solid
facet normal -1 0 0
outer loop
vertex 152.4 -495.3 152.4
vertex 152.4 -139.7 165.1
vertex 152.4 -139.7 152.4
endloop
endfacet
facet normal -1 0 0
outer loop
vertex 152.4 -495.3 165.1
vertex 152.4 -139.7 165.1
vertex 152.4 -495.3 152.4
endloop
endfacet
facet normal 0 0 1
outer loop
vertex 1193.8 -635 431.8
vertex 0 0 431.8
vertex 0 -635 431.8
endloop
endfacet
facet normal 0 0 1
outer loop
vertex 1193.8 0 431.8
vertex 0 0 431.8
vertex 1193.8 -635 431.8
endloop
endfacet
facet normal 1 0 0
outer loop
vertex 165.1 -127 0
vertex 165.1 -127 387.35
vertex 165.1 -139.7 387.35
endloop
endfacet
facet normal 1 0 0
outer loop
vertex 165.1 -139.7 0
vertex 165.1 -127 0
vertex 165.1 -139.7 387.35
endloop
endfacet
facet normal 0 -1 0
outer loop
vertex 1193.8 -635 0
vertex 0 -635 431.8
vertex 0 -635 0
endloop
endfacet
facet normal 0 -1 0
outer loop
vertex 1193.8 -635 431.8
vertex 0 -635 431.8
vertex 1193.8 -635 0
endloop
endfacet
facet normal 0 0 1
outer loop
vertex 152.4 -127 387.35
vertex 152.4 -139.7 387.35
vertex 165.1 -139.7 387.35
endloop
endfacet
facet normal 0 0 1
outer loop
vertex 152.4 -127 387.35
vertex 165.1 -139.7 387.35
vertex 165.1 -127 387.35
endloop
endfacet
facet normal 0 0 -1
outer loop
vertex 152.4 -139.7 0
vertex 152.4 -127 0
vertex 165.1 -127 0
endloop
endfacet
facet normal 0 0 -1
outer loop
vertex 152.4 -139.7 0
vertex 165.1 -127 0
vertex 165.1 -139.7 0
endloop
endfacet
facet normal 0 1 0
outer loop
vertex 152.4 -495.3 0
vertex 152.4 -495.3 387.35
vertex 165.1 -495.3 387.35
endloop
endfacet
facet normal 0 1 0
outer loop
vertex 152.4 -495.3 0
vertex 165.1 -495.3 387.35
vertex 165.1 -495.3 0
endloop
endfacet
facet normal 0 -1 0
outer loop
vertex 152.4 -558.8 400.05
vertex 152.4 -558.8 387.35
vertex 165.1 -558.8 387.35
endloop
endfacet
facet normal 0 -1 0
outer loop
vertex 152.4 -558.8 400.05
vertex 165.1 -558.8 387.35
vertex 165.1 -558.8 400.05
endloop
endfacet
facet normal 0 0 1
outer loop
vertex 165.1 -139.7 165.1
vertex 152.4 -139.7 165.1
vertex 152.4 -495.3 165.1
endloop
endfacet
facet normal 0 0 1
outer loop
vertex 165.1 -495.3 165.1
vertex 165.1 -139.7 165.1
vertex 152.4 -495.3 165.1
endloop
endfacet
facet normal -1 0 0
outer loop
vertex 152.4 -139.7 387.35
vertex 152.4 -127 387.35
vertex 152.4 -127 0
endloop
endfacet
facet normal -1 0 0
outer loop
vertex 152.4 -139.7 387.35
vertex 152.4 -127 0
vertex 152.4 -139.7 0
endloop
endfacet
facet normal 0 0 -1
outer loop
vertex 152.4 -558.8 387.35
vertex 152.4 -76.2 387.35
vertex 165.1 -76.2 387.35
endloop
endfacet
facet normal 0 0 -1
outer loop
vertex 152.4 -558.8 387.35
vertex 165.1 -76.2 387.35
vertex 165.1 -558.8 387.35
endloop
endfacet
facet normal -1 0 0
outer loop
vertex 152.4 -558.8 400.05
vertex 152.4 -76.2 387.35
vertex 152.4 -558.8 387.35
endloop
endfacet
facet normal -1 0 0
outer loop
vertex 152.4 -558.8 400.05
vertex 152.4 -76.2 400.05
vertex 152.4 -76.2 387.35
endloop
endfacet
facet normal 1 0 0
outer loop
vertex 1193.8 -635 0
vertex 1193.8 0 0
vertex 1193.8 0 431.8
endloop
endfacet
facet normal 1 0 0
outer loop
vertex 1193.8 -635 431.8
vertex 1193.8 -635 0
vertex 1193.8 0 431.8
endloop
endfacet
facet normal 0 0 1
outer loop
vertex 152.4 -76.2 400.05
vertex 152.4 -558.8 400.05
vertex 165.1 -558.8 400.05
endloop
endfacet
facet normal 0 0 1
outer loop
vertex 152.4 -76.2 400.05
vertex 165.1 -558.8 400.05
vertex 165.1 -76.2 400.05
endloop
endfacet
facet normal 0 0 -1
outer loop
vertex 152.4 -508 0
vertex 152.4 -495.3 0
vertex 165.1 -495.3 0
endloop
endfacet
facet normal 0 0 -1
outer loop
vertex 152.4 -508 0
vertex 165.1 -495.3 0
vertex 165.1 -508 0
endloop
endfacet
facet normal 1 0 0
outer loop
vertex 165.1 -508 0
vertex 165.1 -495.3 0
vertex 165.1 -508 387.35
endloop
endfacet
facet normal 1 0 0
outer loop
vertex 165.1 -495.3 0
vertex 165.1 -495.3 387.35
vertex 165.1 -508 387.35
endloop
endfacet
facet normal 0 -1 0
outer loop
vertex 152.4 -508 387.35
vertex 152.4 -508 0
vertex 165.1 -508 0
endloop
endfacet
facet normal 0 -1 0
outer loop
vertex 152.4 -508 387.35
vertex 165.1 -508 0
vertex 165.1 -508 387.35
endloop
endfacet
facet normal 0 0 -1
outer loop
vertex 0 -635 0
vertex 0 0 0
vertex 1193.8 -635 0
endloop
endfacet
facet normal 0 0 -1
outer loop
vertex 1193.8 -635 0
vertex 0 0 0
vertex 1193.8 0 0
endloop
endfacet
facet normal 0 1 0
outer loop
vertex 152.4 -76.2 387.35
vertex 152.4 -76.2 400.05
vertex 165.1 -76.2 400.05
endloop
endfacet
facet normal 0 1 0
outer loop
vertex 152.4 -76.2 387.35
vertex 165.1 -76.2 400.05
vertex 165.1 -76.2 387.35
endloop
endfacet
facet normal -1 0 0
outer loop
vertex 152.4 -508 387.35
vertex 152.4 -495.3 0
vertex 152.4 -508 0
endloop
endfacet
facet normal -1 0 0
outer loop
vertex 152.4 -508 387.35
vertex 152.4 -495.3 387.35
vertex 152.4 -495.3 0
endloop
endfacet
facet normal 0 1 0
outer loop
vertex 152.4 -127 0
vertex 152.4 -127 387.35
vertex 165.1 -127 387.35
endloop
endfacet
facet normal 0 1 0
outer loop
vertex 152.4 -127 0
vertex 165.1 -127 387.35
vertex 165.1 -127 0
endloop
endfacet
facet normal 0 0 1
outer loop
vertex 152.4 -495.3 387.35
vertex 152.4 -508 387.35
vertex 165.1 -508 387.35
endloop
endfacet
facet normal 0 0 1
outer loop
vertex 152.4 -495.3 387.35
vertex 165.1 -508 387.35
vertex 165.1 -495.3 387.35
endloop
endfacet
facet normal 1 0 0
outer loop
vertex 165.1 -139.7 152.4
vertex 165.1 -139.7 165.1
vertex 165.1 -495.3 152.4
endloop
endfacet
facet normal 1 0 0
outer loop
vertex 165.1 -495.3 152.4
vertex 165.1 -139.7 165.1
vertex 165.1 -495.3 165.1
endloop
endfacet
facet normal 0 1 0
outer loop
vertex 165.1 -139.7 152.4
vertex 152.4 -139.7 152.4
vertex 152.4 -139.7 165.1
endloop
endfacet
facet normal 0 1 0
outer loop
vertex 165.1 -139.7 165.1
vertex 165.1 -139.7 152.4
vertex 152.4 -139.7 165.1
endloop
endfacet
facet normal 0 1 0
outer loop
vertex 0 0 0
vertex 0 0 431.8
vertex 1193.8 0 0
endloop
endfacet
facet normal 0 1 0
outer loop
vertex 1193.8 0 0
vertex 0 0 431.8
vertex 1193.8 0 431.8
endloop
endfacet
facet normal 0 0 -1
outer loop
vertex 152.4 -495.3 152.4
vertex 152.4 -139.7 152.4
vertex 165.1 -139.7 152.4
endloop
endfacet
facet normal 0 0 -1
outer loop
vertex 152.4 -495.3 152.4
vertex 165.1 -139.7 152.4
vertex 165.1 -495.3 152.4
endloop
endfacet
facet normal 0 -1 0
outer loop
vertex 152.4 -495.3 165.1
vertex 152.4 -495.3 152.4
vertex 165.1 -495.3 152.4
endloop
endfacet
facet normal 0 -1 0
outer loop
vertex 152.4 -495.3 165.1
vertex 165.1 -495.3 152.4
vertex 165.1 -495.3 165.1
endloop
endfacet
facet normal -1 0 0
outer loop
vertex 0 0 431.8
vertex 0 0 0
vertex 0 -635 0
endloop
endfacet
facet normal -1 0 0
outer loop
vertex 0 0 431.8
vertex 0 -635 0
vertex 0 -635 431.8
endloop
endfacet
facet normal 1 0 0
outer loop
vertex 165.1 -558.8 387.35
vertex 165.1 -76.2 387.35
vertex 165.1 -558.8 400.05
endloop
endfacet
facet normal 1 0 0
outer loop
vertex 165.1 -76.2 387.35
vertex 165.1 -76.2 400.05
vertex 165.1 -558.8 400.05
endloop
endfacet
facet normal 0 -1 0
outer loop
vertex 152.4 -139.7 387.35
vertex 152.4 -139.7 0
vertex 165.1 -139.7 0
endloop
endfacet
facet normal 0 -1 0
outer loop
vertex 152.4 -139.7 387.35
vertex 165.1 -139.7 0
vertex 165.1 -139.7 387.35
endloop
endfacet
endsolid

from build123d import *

# Parameters (mm, degrees)
F2_W     = 1193.8
F2_H     = 431.8
F3_DEPTH = 635
F6_DEPTH = 12.7
F7_DEPTH = 12.7
F5_W     = 355.6
F5_H     = 12.7
F8_DEPTH = 12.7
F9_DEPTH = 12.7


# Not quite as in the source:
# - a variable given as a bare number and used for a length is read in inches; the dataset says mm whatever the document's units were


with BuildPart() as f3:
    # F2 (on Front) → F3 (new body)
    with BuildSketch(Plane.XZ):
        with Locations((596.9, 215.9)):
            Rectangle(F2_W, F2_H)
    extrude(amount=F3_DEPTH)


with BuildPart() as f6:
    # F5 (on offset) → F6 (new body)
    with BuildSketch(Plane(origin=(152.4, 0, 0), x_dir=(0, -1, 0), z_dir=(-1, 0, 0))):
        Polygon((76.2, 387.35), (127, 387.35), (139.7, 387.35), (495.3, 387.35), (508, 387.35), (558.8, 387.35), (558.8, 400.05), (76.2, 400.05), align=None)
    extrude(amount=-F6_DEPTH)


with BuildPart() as f7:
    # F5 (on offset) → F7 (new body)
    with BuildSketch(Plane(origin=(152.4, 0, 0), x_dir=(0, -1, 0), z_dir=(-1, 0, 0))):
        Polygon((127, 387.35), (127, 0), (139.7, 0), (139.7, 152.4), (139.7, 165.1), (139.7, 387.35), align=None)
    extrude(amount=-F7_DEPTH)


with BuildPart() as f8:
    # F5 (on offset) → F8 (new body)
    with BuildSketch(Plane(origin=(152.4, 0, 0), x_dir=(0, -1, 0), z_dir=(-1, 0, 0))):
        with Locations((317.5, 158.75)):
            Rectangle(F5_W, F5_H)
    extrude(amount=-F8_DEPTH)


with BuildPart() as f9:
    # F5 (on offset) → F9 (new body)
    with BuildSketch(Plane(origin=(152.4, 0, 0), x_dir=(0, -1, 0), z_dir=(-1, 0, 0))):
        Polygon((495.3, 165.1), (495.3, 152.4), (495.3, 0), (508, 0), (508, 387.35), (495.3, 387.35), align=None)
    extrude(amount=-F9_DEPTH)


solid = Compound([f3.part, f6.part, f7.part, f8.part, f9.part])
